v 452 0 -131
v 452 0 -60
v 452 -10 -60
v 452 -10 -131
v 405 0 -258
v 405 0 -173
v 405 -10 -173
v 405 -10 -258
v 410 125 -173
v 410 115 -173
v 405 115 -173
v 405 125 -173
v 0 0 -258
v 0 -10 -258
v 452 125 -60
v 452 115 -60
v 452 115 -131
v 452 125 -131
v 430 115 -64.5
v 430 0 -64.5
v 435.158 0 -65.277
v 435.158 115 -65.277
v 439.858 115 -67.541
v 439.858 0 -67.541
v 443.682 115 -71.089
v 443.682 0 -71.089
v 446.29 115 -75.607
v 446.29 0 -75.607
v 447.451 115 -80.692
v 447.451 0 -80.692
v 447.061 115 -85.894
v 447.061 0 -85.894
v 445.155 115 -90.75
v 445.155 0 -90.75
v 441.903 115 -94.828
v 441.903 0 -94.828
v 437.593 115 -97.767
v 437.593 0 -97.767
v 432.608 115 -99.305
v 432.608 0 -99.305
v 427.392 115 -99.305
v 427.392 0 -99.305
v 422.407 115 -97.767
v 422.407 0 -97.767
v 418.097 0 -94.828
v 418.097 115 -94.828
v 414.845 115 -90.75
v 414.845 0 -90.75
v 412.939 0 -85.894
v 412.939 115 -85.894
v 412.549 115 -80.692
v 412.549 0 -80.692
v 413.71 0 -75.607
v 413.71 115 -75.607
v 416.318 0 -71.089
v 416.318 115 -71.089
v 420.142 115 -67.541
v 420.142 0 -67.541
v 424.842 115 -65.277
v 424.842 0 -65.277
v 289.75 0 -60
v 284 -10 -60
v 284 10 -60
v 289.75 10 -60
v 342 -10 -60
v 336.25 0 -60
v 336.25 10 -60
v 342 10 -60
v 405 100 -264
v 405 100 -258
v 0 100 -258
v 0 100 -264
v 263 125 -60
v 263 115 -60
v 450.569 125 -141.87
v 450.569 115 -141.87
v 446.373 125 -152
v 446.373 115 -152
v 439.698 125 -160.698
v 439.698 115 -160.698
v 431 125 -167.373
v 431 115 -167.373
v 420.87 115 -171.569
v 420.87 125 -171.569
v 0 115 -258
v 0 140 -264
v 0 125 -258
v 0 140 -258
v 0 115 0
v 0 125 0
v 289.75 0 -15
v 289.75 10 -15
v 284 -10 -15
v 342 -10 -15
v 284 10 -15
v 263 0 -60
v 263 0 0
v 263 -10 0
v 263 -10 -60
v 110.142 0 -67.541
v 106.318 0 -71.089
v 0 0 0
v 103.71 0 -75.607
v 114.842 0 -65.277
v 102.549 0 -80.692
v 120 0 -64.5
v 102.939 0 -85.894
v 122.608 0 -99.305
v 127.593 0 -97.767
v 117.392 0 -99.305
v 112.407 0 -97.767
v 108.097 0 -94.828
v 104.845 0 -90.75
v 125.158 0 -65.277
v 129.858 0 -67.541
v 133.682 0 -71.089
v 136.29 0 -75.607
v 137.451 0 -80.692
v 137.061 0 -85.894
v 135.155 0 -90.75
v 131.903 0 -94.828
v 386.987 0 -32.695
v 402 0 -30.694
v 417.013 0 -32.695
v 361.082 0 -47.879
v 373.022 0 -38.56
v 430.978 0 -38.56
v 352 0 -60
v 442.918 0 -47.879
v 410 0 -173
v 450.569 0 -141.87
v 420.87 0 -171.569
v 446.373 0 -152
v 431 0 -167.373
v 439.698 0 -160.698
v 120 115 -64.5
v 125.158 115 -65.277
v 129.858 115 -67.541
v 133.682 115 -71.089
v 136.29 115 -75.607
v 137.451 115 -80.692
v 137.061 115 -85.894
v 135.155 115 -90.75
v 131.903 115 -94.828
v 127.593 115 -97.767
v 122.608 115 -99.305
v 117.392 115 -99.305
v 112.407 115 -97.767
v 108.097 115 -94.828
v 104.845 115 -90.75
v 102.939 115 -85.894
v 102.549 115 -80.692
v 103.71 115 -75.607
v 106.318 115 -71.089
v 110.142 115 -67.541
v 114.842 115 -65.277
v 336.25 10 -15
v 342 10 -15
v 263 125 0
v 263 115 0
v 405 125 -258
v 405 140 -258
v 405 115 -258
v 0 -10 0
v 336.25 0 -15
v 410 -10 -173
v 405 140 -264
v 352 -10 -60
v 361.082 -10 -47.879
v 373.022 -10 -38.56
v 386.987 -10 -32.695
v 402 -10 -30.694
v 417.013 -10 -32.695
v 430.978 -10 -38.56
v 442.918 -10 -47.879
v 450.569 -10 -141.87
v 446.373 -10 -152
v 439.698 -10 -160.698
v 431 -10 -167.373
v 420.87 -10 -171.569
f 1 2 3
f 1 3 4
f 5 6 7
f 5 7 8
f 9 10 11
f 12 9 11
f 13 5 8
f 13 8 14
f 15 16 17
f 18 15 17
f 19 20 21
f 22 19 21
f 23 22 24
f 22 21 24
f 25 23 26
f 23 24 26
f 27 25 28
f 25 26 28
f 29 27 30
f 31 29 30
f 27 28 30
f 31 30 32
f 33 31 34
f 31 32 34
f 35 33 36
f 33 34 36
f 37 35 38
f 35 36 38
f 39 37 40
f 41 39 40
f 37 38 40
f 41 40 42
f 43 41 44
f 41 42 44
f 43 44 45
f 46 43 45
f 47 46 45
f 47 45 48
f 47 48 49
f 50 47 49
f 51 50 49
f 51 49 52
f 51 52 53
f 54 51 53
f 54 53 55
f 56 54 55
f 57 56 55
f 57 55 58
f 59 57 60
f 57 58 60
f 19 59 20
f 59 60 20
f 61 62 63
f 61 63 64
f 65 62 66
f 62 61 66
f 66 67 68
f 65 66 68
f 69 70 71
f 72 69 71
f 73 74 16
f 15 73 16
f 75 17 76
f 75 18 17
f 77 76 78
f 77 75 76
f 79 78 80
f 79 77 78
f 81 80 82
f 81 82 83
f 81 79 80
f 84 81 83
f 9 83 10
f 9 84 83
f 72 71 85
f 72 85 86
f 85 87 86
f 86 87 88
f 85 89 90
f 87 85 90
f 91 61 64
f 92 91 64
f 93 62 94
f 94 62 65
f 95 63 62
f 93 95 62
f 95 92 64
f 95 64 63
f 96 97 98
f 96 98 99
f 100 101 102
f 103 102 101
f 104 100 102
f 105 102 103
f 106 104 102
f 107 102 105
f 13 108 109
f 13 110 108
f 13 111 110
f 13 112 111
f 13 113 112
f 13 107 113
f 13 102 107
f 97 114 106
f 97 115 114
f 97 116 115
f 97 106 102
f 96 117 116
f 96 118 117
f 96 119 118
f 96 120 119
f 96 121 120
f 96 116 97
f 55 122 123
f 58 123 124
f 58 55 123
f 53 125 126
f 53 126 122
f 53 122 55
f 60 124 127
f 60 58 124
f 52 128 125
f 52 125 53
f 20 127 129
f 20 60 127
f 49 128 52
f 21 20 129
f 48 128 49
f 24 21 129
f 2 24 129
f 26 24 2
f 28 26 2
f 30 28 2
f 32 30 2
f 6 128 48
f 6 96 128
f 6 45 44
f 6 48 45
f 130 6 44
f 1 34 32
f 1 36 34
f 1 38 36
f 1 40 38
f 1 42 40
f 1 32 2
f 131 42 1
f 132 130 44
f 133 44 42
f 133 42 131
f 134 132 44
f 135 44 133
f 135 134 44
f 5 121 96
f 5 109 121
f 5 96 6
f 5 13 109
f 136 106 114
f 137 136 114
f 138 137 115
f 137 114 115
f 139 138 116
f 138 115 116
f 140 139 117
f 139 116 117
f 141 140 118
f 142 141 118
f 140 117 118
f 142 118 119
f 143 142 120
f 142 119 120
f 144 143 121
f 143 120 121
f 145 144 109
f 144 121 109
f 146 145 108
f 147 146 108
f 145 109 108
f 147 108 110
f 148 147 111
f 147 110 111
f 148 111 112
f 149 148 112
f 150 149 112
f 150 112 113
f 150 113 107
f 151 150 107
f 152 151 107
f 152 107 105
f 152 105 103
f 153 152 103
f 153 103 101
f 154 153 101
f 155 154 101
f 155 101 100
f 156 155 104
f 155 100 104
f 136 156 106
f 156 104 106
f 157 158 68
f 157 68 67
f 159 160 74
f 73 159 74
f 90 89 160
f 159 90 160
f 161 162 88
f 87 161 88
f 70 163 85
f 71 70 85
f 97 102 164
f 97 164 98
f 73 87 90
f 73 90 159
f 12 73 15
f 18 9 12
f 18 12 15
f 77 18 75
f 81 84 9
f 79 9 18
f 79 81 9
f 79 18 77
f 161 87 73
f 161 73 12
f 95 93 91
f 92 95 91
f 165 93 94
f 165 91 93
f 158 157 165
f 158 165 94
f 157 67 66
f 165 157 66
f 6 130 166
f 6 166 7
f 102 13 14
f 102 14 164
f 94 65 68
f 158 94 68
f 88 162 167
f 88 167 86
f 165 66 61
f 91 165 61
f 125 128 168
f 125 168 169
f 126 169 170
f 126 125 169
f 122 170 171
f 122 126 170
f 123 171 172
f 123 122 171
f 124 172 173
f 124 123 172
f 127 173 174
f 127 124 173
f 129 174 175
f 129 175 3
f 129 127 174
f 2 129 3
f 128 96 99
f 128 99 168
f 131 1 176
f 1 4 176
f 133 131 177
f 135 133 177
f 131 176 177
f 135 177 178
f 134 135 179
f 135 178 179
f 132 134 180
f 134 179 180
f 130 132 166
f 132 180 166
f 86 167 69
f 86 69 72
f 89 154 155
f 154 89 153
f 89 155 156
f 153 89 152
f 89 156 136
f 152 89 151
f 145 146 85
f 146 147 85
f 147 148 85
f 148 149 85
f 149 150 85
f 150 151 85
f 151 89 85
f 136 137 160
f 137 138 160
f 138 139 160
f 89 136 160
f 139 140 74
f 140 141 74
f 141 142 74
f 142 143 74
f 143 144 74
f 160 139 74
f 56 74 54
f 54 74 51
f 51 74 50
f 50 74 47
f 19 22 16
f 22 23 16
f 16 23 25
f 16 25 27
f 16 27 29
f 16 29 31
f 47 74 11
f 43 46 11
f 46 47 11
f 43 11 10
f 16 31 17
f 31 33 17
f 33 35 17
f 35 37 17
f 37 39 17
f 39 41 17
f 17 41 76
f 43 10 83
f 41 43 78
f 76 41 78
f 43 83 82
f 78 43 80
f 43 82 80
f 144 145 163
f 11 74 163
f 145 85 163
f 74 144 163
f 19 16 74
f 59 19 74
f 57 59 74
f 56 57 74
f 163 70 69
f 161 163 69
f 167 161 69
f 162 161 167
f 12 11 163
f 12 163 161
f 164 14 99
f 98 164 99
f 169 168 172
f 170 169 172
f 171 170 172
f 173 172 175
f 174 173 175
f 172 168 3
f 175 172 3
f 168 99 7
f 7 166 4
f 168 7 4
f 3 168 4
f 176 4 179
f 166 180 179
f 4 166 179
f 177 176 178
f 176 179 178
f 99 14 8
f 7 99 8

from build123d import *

# Parameters (mm, degrees)
AUFSATZ_LINEAR_AUSTRAGEN0_DEPTH       = 10
SKIZZE1_R                             = 17.5
AUFSATZ_LINEAR_AUSTRAGEN1_DEPTH       = 115
AUFSATZ_LINEAR_AUSTRAGEN2_DEPTH       = 10
VERRUNDUNG1_R                         = 42
AUFSATZ_LINEAR_AUSTRAGEN3_DEPTH       = 10
SKIZZE4_W                             = 405
SKIZZE4_H                             = 40
AUFSATZ_LINEAR_AUSTRAGEN4_DEPTH       = 6
HIER_SOLL_NE_KURVE_DRAUS_WERDEN_DEPTH = 45


with BuildPart() as part:
    # Skizze0 → Aufsatz-Linear austragen0 (new body)
    with BuildSketch(Plane(origin=(0, 0, 0), x_dir=(1, 0, 0), z_dir=(0, 1, 0))):
        Polygon((0, 0), (263, 0), (263, 60), (452, 60), (452, 173), (405, 173), (405, 258), (0, 258), align=None)
    extrude(amount=-AUFSATZ_LINEAR_AUSTRAGEN0_DEPTH)

    # Skizze1 → Aufsatz-Linear austragen1 (add)
    with BuildSketch(Plane(origin=(0, 0, 0), x_dir=(1, 0, 0), z_dir=(0, 1, 0))):
        with Locations(Location((120, 82, 0), (0, 0, 270))):  # turned: the seam where the file's is
            Circle(SKIZZE1_R)
        with Locations(Location((430, 82, 0), (0, 0, 270))):  # turned: the seam where the file's is
            Circle(SKIZZE1_R)
    extrude(amount=AUFSATZ_LINEAR_AUSTRAGEN1_DEPTH)

    # Skizze2 → Aufsatz-Linear austragen2 (add)
    with BuildSketch(Plane(origin=(0, 115, 115), x_dir=(1, 0, 0), z_dir=(0, 1, 0))):
        Polygon((0, 115), (263, 115), (263, 175), (452, 175), (452, 288), (405, 288), (405, 373), (0, 373), align=None)
    extrude(amount=AUFSATZ_LINEAR_AUSTRAGEN2_DEPTH)

    # Verrundung1
    verrundung1_edges = [part.edges().sort_by_distance(p)[0] for p in [
        (452, -5, -173),
        (452, 120, -173),
    ]]
    fillet(verrundung1_edges, radius=VERRUNDUNG1_R)

    # Skizze3 → Aufsatz-Linear austragen3 (add)
    with BuildSketch(Plane(origin=(0, 0, 0), x_dir=(1, 0, 0), z_dir=(0, 1, 0))):
        with BuildLine():
            Line((452, 60), (352, 60))
            ThreePointArc((352, 60), (402, 30.693804872), (452, 60))
        make_face()
    extrude(amount=-AUFSATZ_LINEAR_AUSTRAGEN3_DEPTH)

    # Skizze4 → Aufsatz-Linear austragen4 (add)
    with BuildSketch(Plane(origin=(0, 0, -258), x_dir=(-1, 0, 0), z_dir=(0, 0, -1))):
        with Locations((-202.5, 120)):
            Rectangle(SKIZZE4_W, SKIZZE4_H)
    extrude(amount=AUFSATZ_LINEAR_AUSTRAGEN4_DEPTH)


with BuildPart() as body_2:
    # Profil → Hier soll 'ne Kurve draus werden (new body)
    with BuildSketch(Plane.XY.offset(-60)):
        Polygon((284, 10), (284, -10), (342, -10), (342, 10), (336.25, 10), (336.25, 0), (289.75, 0), (289.75, 10), align=None)
    extrude(amount=HIER_SOLL_NE_KURVE_DRAUS_WERDEN_DEPTH)


solid = Compound([part.part, body_2.part])
